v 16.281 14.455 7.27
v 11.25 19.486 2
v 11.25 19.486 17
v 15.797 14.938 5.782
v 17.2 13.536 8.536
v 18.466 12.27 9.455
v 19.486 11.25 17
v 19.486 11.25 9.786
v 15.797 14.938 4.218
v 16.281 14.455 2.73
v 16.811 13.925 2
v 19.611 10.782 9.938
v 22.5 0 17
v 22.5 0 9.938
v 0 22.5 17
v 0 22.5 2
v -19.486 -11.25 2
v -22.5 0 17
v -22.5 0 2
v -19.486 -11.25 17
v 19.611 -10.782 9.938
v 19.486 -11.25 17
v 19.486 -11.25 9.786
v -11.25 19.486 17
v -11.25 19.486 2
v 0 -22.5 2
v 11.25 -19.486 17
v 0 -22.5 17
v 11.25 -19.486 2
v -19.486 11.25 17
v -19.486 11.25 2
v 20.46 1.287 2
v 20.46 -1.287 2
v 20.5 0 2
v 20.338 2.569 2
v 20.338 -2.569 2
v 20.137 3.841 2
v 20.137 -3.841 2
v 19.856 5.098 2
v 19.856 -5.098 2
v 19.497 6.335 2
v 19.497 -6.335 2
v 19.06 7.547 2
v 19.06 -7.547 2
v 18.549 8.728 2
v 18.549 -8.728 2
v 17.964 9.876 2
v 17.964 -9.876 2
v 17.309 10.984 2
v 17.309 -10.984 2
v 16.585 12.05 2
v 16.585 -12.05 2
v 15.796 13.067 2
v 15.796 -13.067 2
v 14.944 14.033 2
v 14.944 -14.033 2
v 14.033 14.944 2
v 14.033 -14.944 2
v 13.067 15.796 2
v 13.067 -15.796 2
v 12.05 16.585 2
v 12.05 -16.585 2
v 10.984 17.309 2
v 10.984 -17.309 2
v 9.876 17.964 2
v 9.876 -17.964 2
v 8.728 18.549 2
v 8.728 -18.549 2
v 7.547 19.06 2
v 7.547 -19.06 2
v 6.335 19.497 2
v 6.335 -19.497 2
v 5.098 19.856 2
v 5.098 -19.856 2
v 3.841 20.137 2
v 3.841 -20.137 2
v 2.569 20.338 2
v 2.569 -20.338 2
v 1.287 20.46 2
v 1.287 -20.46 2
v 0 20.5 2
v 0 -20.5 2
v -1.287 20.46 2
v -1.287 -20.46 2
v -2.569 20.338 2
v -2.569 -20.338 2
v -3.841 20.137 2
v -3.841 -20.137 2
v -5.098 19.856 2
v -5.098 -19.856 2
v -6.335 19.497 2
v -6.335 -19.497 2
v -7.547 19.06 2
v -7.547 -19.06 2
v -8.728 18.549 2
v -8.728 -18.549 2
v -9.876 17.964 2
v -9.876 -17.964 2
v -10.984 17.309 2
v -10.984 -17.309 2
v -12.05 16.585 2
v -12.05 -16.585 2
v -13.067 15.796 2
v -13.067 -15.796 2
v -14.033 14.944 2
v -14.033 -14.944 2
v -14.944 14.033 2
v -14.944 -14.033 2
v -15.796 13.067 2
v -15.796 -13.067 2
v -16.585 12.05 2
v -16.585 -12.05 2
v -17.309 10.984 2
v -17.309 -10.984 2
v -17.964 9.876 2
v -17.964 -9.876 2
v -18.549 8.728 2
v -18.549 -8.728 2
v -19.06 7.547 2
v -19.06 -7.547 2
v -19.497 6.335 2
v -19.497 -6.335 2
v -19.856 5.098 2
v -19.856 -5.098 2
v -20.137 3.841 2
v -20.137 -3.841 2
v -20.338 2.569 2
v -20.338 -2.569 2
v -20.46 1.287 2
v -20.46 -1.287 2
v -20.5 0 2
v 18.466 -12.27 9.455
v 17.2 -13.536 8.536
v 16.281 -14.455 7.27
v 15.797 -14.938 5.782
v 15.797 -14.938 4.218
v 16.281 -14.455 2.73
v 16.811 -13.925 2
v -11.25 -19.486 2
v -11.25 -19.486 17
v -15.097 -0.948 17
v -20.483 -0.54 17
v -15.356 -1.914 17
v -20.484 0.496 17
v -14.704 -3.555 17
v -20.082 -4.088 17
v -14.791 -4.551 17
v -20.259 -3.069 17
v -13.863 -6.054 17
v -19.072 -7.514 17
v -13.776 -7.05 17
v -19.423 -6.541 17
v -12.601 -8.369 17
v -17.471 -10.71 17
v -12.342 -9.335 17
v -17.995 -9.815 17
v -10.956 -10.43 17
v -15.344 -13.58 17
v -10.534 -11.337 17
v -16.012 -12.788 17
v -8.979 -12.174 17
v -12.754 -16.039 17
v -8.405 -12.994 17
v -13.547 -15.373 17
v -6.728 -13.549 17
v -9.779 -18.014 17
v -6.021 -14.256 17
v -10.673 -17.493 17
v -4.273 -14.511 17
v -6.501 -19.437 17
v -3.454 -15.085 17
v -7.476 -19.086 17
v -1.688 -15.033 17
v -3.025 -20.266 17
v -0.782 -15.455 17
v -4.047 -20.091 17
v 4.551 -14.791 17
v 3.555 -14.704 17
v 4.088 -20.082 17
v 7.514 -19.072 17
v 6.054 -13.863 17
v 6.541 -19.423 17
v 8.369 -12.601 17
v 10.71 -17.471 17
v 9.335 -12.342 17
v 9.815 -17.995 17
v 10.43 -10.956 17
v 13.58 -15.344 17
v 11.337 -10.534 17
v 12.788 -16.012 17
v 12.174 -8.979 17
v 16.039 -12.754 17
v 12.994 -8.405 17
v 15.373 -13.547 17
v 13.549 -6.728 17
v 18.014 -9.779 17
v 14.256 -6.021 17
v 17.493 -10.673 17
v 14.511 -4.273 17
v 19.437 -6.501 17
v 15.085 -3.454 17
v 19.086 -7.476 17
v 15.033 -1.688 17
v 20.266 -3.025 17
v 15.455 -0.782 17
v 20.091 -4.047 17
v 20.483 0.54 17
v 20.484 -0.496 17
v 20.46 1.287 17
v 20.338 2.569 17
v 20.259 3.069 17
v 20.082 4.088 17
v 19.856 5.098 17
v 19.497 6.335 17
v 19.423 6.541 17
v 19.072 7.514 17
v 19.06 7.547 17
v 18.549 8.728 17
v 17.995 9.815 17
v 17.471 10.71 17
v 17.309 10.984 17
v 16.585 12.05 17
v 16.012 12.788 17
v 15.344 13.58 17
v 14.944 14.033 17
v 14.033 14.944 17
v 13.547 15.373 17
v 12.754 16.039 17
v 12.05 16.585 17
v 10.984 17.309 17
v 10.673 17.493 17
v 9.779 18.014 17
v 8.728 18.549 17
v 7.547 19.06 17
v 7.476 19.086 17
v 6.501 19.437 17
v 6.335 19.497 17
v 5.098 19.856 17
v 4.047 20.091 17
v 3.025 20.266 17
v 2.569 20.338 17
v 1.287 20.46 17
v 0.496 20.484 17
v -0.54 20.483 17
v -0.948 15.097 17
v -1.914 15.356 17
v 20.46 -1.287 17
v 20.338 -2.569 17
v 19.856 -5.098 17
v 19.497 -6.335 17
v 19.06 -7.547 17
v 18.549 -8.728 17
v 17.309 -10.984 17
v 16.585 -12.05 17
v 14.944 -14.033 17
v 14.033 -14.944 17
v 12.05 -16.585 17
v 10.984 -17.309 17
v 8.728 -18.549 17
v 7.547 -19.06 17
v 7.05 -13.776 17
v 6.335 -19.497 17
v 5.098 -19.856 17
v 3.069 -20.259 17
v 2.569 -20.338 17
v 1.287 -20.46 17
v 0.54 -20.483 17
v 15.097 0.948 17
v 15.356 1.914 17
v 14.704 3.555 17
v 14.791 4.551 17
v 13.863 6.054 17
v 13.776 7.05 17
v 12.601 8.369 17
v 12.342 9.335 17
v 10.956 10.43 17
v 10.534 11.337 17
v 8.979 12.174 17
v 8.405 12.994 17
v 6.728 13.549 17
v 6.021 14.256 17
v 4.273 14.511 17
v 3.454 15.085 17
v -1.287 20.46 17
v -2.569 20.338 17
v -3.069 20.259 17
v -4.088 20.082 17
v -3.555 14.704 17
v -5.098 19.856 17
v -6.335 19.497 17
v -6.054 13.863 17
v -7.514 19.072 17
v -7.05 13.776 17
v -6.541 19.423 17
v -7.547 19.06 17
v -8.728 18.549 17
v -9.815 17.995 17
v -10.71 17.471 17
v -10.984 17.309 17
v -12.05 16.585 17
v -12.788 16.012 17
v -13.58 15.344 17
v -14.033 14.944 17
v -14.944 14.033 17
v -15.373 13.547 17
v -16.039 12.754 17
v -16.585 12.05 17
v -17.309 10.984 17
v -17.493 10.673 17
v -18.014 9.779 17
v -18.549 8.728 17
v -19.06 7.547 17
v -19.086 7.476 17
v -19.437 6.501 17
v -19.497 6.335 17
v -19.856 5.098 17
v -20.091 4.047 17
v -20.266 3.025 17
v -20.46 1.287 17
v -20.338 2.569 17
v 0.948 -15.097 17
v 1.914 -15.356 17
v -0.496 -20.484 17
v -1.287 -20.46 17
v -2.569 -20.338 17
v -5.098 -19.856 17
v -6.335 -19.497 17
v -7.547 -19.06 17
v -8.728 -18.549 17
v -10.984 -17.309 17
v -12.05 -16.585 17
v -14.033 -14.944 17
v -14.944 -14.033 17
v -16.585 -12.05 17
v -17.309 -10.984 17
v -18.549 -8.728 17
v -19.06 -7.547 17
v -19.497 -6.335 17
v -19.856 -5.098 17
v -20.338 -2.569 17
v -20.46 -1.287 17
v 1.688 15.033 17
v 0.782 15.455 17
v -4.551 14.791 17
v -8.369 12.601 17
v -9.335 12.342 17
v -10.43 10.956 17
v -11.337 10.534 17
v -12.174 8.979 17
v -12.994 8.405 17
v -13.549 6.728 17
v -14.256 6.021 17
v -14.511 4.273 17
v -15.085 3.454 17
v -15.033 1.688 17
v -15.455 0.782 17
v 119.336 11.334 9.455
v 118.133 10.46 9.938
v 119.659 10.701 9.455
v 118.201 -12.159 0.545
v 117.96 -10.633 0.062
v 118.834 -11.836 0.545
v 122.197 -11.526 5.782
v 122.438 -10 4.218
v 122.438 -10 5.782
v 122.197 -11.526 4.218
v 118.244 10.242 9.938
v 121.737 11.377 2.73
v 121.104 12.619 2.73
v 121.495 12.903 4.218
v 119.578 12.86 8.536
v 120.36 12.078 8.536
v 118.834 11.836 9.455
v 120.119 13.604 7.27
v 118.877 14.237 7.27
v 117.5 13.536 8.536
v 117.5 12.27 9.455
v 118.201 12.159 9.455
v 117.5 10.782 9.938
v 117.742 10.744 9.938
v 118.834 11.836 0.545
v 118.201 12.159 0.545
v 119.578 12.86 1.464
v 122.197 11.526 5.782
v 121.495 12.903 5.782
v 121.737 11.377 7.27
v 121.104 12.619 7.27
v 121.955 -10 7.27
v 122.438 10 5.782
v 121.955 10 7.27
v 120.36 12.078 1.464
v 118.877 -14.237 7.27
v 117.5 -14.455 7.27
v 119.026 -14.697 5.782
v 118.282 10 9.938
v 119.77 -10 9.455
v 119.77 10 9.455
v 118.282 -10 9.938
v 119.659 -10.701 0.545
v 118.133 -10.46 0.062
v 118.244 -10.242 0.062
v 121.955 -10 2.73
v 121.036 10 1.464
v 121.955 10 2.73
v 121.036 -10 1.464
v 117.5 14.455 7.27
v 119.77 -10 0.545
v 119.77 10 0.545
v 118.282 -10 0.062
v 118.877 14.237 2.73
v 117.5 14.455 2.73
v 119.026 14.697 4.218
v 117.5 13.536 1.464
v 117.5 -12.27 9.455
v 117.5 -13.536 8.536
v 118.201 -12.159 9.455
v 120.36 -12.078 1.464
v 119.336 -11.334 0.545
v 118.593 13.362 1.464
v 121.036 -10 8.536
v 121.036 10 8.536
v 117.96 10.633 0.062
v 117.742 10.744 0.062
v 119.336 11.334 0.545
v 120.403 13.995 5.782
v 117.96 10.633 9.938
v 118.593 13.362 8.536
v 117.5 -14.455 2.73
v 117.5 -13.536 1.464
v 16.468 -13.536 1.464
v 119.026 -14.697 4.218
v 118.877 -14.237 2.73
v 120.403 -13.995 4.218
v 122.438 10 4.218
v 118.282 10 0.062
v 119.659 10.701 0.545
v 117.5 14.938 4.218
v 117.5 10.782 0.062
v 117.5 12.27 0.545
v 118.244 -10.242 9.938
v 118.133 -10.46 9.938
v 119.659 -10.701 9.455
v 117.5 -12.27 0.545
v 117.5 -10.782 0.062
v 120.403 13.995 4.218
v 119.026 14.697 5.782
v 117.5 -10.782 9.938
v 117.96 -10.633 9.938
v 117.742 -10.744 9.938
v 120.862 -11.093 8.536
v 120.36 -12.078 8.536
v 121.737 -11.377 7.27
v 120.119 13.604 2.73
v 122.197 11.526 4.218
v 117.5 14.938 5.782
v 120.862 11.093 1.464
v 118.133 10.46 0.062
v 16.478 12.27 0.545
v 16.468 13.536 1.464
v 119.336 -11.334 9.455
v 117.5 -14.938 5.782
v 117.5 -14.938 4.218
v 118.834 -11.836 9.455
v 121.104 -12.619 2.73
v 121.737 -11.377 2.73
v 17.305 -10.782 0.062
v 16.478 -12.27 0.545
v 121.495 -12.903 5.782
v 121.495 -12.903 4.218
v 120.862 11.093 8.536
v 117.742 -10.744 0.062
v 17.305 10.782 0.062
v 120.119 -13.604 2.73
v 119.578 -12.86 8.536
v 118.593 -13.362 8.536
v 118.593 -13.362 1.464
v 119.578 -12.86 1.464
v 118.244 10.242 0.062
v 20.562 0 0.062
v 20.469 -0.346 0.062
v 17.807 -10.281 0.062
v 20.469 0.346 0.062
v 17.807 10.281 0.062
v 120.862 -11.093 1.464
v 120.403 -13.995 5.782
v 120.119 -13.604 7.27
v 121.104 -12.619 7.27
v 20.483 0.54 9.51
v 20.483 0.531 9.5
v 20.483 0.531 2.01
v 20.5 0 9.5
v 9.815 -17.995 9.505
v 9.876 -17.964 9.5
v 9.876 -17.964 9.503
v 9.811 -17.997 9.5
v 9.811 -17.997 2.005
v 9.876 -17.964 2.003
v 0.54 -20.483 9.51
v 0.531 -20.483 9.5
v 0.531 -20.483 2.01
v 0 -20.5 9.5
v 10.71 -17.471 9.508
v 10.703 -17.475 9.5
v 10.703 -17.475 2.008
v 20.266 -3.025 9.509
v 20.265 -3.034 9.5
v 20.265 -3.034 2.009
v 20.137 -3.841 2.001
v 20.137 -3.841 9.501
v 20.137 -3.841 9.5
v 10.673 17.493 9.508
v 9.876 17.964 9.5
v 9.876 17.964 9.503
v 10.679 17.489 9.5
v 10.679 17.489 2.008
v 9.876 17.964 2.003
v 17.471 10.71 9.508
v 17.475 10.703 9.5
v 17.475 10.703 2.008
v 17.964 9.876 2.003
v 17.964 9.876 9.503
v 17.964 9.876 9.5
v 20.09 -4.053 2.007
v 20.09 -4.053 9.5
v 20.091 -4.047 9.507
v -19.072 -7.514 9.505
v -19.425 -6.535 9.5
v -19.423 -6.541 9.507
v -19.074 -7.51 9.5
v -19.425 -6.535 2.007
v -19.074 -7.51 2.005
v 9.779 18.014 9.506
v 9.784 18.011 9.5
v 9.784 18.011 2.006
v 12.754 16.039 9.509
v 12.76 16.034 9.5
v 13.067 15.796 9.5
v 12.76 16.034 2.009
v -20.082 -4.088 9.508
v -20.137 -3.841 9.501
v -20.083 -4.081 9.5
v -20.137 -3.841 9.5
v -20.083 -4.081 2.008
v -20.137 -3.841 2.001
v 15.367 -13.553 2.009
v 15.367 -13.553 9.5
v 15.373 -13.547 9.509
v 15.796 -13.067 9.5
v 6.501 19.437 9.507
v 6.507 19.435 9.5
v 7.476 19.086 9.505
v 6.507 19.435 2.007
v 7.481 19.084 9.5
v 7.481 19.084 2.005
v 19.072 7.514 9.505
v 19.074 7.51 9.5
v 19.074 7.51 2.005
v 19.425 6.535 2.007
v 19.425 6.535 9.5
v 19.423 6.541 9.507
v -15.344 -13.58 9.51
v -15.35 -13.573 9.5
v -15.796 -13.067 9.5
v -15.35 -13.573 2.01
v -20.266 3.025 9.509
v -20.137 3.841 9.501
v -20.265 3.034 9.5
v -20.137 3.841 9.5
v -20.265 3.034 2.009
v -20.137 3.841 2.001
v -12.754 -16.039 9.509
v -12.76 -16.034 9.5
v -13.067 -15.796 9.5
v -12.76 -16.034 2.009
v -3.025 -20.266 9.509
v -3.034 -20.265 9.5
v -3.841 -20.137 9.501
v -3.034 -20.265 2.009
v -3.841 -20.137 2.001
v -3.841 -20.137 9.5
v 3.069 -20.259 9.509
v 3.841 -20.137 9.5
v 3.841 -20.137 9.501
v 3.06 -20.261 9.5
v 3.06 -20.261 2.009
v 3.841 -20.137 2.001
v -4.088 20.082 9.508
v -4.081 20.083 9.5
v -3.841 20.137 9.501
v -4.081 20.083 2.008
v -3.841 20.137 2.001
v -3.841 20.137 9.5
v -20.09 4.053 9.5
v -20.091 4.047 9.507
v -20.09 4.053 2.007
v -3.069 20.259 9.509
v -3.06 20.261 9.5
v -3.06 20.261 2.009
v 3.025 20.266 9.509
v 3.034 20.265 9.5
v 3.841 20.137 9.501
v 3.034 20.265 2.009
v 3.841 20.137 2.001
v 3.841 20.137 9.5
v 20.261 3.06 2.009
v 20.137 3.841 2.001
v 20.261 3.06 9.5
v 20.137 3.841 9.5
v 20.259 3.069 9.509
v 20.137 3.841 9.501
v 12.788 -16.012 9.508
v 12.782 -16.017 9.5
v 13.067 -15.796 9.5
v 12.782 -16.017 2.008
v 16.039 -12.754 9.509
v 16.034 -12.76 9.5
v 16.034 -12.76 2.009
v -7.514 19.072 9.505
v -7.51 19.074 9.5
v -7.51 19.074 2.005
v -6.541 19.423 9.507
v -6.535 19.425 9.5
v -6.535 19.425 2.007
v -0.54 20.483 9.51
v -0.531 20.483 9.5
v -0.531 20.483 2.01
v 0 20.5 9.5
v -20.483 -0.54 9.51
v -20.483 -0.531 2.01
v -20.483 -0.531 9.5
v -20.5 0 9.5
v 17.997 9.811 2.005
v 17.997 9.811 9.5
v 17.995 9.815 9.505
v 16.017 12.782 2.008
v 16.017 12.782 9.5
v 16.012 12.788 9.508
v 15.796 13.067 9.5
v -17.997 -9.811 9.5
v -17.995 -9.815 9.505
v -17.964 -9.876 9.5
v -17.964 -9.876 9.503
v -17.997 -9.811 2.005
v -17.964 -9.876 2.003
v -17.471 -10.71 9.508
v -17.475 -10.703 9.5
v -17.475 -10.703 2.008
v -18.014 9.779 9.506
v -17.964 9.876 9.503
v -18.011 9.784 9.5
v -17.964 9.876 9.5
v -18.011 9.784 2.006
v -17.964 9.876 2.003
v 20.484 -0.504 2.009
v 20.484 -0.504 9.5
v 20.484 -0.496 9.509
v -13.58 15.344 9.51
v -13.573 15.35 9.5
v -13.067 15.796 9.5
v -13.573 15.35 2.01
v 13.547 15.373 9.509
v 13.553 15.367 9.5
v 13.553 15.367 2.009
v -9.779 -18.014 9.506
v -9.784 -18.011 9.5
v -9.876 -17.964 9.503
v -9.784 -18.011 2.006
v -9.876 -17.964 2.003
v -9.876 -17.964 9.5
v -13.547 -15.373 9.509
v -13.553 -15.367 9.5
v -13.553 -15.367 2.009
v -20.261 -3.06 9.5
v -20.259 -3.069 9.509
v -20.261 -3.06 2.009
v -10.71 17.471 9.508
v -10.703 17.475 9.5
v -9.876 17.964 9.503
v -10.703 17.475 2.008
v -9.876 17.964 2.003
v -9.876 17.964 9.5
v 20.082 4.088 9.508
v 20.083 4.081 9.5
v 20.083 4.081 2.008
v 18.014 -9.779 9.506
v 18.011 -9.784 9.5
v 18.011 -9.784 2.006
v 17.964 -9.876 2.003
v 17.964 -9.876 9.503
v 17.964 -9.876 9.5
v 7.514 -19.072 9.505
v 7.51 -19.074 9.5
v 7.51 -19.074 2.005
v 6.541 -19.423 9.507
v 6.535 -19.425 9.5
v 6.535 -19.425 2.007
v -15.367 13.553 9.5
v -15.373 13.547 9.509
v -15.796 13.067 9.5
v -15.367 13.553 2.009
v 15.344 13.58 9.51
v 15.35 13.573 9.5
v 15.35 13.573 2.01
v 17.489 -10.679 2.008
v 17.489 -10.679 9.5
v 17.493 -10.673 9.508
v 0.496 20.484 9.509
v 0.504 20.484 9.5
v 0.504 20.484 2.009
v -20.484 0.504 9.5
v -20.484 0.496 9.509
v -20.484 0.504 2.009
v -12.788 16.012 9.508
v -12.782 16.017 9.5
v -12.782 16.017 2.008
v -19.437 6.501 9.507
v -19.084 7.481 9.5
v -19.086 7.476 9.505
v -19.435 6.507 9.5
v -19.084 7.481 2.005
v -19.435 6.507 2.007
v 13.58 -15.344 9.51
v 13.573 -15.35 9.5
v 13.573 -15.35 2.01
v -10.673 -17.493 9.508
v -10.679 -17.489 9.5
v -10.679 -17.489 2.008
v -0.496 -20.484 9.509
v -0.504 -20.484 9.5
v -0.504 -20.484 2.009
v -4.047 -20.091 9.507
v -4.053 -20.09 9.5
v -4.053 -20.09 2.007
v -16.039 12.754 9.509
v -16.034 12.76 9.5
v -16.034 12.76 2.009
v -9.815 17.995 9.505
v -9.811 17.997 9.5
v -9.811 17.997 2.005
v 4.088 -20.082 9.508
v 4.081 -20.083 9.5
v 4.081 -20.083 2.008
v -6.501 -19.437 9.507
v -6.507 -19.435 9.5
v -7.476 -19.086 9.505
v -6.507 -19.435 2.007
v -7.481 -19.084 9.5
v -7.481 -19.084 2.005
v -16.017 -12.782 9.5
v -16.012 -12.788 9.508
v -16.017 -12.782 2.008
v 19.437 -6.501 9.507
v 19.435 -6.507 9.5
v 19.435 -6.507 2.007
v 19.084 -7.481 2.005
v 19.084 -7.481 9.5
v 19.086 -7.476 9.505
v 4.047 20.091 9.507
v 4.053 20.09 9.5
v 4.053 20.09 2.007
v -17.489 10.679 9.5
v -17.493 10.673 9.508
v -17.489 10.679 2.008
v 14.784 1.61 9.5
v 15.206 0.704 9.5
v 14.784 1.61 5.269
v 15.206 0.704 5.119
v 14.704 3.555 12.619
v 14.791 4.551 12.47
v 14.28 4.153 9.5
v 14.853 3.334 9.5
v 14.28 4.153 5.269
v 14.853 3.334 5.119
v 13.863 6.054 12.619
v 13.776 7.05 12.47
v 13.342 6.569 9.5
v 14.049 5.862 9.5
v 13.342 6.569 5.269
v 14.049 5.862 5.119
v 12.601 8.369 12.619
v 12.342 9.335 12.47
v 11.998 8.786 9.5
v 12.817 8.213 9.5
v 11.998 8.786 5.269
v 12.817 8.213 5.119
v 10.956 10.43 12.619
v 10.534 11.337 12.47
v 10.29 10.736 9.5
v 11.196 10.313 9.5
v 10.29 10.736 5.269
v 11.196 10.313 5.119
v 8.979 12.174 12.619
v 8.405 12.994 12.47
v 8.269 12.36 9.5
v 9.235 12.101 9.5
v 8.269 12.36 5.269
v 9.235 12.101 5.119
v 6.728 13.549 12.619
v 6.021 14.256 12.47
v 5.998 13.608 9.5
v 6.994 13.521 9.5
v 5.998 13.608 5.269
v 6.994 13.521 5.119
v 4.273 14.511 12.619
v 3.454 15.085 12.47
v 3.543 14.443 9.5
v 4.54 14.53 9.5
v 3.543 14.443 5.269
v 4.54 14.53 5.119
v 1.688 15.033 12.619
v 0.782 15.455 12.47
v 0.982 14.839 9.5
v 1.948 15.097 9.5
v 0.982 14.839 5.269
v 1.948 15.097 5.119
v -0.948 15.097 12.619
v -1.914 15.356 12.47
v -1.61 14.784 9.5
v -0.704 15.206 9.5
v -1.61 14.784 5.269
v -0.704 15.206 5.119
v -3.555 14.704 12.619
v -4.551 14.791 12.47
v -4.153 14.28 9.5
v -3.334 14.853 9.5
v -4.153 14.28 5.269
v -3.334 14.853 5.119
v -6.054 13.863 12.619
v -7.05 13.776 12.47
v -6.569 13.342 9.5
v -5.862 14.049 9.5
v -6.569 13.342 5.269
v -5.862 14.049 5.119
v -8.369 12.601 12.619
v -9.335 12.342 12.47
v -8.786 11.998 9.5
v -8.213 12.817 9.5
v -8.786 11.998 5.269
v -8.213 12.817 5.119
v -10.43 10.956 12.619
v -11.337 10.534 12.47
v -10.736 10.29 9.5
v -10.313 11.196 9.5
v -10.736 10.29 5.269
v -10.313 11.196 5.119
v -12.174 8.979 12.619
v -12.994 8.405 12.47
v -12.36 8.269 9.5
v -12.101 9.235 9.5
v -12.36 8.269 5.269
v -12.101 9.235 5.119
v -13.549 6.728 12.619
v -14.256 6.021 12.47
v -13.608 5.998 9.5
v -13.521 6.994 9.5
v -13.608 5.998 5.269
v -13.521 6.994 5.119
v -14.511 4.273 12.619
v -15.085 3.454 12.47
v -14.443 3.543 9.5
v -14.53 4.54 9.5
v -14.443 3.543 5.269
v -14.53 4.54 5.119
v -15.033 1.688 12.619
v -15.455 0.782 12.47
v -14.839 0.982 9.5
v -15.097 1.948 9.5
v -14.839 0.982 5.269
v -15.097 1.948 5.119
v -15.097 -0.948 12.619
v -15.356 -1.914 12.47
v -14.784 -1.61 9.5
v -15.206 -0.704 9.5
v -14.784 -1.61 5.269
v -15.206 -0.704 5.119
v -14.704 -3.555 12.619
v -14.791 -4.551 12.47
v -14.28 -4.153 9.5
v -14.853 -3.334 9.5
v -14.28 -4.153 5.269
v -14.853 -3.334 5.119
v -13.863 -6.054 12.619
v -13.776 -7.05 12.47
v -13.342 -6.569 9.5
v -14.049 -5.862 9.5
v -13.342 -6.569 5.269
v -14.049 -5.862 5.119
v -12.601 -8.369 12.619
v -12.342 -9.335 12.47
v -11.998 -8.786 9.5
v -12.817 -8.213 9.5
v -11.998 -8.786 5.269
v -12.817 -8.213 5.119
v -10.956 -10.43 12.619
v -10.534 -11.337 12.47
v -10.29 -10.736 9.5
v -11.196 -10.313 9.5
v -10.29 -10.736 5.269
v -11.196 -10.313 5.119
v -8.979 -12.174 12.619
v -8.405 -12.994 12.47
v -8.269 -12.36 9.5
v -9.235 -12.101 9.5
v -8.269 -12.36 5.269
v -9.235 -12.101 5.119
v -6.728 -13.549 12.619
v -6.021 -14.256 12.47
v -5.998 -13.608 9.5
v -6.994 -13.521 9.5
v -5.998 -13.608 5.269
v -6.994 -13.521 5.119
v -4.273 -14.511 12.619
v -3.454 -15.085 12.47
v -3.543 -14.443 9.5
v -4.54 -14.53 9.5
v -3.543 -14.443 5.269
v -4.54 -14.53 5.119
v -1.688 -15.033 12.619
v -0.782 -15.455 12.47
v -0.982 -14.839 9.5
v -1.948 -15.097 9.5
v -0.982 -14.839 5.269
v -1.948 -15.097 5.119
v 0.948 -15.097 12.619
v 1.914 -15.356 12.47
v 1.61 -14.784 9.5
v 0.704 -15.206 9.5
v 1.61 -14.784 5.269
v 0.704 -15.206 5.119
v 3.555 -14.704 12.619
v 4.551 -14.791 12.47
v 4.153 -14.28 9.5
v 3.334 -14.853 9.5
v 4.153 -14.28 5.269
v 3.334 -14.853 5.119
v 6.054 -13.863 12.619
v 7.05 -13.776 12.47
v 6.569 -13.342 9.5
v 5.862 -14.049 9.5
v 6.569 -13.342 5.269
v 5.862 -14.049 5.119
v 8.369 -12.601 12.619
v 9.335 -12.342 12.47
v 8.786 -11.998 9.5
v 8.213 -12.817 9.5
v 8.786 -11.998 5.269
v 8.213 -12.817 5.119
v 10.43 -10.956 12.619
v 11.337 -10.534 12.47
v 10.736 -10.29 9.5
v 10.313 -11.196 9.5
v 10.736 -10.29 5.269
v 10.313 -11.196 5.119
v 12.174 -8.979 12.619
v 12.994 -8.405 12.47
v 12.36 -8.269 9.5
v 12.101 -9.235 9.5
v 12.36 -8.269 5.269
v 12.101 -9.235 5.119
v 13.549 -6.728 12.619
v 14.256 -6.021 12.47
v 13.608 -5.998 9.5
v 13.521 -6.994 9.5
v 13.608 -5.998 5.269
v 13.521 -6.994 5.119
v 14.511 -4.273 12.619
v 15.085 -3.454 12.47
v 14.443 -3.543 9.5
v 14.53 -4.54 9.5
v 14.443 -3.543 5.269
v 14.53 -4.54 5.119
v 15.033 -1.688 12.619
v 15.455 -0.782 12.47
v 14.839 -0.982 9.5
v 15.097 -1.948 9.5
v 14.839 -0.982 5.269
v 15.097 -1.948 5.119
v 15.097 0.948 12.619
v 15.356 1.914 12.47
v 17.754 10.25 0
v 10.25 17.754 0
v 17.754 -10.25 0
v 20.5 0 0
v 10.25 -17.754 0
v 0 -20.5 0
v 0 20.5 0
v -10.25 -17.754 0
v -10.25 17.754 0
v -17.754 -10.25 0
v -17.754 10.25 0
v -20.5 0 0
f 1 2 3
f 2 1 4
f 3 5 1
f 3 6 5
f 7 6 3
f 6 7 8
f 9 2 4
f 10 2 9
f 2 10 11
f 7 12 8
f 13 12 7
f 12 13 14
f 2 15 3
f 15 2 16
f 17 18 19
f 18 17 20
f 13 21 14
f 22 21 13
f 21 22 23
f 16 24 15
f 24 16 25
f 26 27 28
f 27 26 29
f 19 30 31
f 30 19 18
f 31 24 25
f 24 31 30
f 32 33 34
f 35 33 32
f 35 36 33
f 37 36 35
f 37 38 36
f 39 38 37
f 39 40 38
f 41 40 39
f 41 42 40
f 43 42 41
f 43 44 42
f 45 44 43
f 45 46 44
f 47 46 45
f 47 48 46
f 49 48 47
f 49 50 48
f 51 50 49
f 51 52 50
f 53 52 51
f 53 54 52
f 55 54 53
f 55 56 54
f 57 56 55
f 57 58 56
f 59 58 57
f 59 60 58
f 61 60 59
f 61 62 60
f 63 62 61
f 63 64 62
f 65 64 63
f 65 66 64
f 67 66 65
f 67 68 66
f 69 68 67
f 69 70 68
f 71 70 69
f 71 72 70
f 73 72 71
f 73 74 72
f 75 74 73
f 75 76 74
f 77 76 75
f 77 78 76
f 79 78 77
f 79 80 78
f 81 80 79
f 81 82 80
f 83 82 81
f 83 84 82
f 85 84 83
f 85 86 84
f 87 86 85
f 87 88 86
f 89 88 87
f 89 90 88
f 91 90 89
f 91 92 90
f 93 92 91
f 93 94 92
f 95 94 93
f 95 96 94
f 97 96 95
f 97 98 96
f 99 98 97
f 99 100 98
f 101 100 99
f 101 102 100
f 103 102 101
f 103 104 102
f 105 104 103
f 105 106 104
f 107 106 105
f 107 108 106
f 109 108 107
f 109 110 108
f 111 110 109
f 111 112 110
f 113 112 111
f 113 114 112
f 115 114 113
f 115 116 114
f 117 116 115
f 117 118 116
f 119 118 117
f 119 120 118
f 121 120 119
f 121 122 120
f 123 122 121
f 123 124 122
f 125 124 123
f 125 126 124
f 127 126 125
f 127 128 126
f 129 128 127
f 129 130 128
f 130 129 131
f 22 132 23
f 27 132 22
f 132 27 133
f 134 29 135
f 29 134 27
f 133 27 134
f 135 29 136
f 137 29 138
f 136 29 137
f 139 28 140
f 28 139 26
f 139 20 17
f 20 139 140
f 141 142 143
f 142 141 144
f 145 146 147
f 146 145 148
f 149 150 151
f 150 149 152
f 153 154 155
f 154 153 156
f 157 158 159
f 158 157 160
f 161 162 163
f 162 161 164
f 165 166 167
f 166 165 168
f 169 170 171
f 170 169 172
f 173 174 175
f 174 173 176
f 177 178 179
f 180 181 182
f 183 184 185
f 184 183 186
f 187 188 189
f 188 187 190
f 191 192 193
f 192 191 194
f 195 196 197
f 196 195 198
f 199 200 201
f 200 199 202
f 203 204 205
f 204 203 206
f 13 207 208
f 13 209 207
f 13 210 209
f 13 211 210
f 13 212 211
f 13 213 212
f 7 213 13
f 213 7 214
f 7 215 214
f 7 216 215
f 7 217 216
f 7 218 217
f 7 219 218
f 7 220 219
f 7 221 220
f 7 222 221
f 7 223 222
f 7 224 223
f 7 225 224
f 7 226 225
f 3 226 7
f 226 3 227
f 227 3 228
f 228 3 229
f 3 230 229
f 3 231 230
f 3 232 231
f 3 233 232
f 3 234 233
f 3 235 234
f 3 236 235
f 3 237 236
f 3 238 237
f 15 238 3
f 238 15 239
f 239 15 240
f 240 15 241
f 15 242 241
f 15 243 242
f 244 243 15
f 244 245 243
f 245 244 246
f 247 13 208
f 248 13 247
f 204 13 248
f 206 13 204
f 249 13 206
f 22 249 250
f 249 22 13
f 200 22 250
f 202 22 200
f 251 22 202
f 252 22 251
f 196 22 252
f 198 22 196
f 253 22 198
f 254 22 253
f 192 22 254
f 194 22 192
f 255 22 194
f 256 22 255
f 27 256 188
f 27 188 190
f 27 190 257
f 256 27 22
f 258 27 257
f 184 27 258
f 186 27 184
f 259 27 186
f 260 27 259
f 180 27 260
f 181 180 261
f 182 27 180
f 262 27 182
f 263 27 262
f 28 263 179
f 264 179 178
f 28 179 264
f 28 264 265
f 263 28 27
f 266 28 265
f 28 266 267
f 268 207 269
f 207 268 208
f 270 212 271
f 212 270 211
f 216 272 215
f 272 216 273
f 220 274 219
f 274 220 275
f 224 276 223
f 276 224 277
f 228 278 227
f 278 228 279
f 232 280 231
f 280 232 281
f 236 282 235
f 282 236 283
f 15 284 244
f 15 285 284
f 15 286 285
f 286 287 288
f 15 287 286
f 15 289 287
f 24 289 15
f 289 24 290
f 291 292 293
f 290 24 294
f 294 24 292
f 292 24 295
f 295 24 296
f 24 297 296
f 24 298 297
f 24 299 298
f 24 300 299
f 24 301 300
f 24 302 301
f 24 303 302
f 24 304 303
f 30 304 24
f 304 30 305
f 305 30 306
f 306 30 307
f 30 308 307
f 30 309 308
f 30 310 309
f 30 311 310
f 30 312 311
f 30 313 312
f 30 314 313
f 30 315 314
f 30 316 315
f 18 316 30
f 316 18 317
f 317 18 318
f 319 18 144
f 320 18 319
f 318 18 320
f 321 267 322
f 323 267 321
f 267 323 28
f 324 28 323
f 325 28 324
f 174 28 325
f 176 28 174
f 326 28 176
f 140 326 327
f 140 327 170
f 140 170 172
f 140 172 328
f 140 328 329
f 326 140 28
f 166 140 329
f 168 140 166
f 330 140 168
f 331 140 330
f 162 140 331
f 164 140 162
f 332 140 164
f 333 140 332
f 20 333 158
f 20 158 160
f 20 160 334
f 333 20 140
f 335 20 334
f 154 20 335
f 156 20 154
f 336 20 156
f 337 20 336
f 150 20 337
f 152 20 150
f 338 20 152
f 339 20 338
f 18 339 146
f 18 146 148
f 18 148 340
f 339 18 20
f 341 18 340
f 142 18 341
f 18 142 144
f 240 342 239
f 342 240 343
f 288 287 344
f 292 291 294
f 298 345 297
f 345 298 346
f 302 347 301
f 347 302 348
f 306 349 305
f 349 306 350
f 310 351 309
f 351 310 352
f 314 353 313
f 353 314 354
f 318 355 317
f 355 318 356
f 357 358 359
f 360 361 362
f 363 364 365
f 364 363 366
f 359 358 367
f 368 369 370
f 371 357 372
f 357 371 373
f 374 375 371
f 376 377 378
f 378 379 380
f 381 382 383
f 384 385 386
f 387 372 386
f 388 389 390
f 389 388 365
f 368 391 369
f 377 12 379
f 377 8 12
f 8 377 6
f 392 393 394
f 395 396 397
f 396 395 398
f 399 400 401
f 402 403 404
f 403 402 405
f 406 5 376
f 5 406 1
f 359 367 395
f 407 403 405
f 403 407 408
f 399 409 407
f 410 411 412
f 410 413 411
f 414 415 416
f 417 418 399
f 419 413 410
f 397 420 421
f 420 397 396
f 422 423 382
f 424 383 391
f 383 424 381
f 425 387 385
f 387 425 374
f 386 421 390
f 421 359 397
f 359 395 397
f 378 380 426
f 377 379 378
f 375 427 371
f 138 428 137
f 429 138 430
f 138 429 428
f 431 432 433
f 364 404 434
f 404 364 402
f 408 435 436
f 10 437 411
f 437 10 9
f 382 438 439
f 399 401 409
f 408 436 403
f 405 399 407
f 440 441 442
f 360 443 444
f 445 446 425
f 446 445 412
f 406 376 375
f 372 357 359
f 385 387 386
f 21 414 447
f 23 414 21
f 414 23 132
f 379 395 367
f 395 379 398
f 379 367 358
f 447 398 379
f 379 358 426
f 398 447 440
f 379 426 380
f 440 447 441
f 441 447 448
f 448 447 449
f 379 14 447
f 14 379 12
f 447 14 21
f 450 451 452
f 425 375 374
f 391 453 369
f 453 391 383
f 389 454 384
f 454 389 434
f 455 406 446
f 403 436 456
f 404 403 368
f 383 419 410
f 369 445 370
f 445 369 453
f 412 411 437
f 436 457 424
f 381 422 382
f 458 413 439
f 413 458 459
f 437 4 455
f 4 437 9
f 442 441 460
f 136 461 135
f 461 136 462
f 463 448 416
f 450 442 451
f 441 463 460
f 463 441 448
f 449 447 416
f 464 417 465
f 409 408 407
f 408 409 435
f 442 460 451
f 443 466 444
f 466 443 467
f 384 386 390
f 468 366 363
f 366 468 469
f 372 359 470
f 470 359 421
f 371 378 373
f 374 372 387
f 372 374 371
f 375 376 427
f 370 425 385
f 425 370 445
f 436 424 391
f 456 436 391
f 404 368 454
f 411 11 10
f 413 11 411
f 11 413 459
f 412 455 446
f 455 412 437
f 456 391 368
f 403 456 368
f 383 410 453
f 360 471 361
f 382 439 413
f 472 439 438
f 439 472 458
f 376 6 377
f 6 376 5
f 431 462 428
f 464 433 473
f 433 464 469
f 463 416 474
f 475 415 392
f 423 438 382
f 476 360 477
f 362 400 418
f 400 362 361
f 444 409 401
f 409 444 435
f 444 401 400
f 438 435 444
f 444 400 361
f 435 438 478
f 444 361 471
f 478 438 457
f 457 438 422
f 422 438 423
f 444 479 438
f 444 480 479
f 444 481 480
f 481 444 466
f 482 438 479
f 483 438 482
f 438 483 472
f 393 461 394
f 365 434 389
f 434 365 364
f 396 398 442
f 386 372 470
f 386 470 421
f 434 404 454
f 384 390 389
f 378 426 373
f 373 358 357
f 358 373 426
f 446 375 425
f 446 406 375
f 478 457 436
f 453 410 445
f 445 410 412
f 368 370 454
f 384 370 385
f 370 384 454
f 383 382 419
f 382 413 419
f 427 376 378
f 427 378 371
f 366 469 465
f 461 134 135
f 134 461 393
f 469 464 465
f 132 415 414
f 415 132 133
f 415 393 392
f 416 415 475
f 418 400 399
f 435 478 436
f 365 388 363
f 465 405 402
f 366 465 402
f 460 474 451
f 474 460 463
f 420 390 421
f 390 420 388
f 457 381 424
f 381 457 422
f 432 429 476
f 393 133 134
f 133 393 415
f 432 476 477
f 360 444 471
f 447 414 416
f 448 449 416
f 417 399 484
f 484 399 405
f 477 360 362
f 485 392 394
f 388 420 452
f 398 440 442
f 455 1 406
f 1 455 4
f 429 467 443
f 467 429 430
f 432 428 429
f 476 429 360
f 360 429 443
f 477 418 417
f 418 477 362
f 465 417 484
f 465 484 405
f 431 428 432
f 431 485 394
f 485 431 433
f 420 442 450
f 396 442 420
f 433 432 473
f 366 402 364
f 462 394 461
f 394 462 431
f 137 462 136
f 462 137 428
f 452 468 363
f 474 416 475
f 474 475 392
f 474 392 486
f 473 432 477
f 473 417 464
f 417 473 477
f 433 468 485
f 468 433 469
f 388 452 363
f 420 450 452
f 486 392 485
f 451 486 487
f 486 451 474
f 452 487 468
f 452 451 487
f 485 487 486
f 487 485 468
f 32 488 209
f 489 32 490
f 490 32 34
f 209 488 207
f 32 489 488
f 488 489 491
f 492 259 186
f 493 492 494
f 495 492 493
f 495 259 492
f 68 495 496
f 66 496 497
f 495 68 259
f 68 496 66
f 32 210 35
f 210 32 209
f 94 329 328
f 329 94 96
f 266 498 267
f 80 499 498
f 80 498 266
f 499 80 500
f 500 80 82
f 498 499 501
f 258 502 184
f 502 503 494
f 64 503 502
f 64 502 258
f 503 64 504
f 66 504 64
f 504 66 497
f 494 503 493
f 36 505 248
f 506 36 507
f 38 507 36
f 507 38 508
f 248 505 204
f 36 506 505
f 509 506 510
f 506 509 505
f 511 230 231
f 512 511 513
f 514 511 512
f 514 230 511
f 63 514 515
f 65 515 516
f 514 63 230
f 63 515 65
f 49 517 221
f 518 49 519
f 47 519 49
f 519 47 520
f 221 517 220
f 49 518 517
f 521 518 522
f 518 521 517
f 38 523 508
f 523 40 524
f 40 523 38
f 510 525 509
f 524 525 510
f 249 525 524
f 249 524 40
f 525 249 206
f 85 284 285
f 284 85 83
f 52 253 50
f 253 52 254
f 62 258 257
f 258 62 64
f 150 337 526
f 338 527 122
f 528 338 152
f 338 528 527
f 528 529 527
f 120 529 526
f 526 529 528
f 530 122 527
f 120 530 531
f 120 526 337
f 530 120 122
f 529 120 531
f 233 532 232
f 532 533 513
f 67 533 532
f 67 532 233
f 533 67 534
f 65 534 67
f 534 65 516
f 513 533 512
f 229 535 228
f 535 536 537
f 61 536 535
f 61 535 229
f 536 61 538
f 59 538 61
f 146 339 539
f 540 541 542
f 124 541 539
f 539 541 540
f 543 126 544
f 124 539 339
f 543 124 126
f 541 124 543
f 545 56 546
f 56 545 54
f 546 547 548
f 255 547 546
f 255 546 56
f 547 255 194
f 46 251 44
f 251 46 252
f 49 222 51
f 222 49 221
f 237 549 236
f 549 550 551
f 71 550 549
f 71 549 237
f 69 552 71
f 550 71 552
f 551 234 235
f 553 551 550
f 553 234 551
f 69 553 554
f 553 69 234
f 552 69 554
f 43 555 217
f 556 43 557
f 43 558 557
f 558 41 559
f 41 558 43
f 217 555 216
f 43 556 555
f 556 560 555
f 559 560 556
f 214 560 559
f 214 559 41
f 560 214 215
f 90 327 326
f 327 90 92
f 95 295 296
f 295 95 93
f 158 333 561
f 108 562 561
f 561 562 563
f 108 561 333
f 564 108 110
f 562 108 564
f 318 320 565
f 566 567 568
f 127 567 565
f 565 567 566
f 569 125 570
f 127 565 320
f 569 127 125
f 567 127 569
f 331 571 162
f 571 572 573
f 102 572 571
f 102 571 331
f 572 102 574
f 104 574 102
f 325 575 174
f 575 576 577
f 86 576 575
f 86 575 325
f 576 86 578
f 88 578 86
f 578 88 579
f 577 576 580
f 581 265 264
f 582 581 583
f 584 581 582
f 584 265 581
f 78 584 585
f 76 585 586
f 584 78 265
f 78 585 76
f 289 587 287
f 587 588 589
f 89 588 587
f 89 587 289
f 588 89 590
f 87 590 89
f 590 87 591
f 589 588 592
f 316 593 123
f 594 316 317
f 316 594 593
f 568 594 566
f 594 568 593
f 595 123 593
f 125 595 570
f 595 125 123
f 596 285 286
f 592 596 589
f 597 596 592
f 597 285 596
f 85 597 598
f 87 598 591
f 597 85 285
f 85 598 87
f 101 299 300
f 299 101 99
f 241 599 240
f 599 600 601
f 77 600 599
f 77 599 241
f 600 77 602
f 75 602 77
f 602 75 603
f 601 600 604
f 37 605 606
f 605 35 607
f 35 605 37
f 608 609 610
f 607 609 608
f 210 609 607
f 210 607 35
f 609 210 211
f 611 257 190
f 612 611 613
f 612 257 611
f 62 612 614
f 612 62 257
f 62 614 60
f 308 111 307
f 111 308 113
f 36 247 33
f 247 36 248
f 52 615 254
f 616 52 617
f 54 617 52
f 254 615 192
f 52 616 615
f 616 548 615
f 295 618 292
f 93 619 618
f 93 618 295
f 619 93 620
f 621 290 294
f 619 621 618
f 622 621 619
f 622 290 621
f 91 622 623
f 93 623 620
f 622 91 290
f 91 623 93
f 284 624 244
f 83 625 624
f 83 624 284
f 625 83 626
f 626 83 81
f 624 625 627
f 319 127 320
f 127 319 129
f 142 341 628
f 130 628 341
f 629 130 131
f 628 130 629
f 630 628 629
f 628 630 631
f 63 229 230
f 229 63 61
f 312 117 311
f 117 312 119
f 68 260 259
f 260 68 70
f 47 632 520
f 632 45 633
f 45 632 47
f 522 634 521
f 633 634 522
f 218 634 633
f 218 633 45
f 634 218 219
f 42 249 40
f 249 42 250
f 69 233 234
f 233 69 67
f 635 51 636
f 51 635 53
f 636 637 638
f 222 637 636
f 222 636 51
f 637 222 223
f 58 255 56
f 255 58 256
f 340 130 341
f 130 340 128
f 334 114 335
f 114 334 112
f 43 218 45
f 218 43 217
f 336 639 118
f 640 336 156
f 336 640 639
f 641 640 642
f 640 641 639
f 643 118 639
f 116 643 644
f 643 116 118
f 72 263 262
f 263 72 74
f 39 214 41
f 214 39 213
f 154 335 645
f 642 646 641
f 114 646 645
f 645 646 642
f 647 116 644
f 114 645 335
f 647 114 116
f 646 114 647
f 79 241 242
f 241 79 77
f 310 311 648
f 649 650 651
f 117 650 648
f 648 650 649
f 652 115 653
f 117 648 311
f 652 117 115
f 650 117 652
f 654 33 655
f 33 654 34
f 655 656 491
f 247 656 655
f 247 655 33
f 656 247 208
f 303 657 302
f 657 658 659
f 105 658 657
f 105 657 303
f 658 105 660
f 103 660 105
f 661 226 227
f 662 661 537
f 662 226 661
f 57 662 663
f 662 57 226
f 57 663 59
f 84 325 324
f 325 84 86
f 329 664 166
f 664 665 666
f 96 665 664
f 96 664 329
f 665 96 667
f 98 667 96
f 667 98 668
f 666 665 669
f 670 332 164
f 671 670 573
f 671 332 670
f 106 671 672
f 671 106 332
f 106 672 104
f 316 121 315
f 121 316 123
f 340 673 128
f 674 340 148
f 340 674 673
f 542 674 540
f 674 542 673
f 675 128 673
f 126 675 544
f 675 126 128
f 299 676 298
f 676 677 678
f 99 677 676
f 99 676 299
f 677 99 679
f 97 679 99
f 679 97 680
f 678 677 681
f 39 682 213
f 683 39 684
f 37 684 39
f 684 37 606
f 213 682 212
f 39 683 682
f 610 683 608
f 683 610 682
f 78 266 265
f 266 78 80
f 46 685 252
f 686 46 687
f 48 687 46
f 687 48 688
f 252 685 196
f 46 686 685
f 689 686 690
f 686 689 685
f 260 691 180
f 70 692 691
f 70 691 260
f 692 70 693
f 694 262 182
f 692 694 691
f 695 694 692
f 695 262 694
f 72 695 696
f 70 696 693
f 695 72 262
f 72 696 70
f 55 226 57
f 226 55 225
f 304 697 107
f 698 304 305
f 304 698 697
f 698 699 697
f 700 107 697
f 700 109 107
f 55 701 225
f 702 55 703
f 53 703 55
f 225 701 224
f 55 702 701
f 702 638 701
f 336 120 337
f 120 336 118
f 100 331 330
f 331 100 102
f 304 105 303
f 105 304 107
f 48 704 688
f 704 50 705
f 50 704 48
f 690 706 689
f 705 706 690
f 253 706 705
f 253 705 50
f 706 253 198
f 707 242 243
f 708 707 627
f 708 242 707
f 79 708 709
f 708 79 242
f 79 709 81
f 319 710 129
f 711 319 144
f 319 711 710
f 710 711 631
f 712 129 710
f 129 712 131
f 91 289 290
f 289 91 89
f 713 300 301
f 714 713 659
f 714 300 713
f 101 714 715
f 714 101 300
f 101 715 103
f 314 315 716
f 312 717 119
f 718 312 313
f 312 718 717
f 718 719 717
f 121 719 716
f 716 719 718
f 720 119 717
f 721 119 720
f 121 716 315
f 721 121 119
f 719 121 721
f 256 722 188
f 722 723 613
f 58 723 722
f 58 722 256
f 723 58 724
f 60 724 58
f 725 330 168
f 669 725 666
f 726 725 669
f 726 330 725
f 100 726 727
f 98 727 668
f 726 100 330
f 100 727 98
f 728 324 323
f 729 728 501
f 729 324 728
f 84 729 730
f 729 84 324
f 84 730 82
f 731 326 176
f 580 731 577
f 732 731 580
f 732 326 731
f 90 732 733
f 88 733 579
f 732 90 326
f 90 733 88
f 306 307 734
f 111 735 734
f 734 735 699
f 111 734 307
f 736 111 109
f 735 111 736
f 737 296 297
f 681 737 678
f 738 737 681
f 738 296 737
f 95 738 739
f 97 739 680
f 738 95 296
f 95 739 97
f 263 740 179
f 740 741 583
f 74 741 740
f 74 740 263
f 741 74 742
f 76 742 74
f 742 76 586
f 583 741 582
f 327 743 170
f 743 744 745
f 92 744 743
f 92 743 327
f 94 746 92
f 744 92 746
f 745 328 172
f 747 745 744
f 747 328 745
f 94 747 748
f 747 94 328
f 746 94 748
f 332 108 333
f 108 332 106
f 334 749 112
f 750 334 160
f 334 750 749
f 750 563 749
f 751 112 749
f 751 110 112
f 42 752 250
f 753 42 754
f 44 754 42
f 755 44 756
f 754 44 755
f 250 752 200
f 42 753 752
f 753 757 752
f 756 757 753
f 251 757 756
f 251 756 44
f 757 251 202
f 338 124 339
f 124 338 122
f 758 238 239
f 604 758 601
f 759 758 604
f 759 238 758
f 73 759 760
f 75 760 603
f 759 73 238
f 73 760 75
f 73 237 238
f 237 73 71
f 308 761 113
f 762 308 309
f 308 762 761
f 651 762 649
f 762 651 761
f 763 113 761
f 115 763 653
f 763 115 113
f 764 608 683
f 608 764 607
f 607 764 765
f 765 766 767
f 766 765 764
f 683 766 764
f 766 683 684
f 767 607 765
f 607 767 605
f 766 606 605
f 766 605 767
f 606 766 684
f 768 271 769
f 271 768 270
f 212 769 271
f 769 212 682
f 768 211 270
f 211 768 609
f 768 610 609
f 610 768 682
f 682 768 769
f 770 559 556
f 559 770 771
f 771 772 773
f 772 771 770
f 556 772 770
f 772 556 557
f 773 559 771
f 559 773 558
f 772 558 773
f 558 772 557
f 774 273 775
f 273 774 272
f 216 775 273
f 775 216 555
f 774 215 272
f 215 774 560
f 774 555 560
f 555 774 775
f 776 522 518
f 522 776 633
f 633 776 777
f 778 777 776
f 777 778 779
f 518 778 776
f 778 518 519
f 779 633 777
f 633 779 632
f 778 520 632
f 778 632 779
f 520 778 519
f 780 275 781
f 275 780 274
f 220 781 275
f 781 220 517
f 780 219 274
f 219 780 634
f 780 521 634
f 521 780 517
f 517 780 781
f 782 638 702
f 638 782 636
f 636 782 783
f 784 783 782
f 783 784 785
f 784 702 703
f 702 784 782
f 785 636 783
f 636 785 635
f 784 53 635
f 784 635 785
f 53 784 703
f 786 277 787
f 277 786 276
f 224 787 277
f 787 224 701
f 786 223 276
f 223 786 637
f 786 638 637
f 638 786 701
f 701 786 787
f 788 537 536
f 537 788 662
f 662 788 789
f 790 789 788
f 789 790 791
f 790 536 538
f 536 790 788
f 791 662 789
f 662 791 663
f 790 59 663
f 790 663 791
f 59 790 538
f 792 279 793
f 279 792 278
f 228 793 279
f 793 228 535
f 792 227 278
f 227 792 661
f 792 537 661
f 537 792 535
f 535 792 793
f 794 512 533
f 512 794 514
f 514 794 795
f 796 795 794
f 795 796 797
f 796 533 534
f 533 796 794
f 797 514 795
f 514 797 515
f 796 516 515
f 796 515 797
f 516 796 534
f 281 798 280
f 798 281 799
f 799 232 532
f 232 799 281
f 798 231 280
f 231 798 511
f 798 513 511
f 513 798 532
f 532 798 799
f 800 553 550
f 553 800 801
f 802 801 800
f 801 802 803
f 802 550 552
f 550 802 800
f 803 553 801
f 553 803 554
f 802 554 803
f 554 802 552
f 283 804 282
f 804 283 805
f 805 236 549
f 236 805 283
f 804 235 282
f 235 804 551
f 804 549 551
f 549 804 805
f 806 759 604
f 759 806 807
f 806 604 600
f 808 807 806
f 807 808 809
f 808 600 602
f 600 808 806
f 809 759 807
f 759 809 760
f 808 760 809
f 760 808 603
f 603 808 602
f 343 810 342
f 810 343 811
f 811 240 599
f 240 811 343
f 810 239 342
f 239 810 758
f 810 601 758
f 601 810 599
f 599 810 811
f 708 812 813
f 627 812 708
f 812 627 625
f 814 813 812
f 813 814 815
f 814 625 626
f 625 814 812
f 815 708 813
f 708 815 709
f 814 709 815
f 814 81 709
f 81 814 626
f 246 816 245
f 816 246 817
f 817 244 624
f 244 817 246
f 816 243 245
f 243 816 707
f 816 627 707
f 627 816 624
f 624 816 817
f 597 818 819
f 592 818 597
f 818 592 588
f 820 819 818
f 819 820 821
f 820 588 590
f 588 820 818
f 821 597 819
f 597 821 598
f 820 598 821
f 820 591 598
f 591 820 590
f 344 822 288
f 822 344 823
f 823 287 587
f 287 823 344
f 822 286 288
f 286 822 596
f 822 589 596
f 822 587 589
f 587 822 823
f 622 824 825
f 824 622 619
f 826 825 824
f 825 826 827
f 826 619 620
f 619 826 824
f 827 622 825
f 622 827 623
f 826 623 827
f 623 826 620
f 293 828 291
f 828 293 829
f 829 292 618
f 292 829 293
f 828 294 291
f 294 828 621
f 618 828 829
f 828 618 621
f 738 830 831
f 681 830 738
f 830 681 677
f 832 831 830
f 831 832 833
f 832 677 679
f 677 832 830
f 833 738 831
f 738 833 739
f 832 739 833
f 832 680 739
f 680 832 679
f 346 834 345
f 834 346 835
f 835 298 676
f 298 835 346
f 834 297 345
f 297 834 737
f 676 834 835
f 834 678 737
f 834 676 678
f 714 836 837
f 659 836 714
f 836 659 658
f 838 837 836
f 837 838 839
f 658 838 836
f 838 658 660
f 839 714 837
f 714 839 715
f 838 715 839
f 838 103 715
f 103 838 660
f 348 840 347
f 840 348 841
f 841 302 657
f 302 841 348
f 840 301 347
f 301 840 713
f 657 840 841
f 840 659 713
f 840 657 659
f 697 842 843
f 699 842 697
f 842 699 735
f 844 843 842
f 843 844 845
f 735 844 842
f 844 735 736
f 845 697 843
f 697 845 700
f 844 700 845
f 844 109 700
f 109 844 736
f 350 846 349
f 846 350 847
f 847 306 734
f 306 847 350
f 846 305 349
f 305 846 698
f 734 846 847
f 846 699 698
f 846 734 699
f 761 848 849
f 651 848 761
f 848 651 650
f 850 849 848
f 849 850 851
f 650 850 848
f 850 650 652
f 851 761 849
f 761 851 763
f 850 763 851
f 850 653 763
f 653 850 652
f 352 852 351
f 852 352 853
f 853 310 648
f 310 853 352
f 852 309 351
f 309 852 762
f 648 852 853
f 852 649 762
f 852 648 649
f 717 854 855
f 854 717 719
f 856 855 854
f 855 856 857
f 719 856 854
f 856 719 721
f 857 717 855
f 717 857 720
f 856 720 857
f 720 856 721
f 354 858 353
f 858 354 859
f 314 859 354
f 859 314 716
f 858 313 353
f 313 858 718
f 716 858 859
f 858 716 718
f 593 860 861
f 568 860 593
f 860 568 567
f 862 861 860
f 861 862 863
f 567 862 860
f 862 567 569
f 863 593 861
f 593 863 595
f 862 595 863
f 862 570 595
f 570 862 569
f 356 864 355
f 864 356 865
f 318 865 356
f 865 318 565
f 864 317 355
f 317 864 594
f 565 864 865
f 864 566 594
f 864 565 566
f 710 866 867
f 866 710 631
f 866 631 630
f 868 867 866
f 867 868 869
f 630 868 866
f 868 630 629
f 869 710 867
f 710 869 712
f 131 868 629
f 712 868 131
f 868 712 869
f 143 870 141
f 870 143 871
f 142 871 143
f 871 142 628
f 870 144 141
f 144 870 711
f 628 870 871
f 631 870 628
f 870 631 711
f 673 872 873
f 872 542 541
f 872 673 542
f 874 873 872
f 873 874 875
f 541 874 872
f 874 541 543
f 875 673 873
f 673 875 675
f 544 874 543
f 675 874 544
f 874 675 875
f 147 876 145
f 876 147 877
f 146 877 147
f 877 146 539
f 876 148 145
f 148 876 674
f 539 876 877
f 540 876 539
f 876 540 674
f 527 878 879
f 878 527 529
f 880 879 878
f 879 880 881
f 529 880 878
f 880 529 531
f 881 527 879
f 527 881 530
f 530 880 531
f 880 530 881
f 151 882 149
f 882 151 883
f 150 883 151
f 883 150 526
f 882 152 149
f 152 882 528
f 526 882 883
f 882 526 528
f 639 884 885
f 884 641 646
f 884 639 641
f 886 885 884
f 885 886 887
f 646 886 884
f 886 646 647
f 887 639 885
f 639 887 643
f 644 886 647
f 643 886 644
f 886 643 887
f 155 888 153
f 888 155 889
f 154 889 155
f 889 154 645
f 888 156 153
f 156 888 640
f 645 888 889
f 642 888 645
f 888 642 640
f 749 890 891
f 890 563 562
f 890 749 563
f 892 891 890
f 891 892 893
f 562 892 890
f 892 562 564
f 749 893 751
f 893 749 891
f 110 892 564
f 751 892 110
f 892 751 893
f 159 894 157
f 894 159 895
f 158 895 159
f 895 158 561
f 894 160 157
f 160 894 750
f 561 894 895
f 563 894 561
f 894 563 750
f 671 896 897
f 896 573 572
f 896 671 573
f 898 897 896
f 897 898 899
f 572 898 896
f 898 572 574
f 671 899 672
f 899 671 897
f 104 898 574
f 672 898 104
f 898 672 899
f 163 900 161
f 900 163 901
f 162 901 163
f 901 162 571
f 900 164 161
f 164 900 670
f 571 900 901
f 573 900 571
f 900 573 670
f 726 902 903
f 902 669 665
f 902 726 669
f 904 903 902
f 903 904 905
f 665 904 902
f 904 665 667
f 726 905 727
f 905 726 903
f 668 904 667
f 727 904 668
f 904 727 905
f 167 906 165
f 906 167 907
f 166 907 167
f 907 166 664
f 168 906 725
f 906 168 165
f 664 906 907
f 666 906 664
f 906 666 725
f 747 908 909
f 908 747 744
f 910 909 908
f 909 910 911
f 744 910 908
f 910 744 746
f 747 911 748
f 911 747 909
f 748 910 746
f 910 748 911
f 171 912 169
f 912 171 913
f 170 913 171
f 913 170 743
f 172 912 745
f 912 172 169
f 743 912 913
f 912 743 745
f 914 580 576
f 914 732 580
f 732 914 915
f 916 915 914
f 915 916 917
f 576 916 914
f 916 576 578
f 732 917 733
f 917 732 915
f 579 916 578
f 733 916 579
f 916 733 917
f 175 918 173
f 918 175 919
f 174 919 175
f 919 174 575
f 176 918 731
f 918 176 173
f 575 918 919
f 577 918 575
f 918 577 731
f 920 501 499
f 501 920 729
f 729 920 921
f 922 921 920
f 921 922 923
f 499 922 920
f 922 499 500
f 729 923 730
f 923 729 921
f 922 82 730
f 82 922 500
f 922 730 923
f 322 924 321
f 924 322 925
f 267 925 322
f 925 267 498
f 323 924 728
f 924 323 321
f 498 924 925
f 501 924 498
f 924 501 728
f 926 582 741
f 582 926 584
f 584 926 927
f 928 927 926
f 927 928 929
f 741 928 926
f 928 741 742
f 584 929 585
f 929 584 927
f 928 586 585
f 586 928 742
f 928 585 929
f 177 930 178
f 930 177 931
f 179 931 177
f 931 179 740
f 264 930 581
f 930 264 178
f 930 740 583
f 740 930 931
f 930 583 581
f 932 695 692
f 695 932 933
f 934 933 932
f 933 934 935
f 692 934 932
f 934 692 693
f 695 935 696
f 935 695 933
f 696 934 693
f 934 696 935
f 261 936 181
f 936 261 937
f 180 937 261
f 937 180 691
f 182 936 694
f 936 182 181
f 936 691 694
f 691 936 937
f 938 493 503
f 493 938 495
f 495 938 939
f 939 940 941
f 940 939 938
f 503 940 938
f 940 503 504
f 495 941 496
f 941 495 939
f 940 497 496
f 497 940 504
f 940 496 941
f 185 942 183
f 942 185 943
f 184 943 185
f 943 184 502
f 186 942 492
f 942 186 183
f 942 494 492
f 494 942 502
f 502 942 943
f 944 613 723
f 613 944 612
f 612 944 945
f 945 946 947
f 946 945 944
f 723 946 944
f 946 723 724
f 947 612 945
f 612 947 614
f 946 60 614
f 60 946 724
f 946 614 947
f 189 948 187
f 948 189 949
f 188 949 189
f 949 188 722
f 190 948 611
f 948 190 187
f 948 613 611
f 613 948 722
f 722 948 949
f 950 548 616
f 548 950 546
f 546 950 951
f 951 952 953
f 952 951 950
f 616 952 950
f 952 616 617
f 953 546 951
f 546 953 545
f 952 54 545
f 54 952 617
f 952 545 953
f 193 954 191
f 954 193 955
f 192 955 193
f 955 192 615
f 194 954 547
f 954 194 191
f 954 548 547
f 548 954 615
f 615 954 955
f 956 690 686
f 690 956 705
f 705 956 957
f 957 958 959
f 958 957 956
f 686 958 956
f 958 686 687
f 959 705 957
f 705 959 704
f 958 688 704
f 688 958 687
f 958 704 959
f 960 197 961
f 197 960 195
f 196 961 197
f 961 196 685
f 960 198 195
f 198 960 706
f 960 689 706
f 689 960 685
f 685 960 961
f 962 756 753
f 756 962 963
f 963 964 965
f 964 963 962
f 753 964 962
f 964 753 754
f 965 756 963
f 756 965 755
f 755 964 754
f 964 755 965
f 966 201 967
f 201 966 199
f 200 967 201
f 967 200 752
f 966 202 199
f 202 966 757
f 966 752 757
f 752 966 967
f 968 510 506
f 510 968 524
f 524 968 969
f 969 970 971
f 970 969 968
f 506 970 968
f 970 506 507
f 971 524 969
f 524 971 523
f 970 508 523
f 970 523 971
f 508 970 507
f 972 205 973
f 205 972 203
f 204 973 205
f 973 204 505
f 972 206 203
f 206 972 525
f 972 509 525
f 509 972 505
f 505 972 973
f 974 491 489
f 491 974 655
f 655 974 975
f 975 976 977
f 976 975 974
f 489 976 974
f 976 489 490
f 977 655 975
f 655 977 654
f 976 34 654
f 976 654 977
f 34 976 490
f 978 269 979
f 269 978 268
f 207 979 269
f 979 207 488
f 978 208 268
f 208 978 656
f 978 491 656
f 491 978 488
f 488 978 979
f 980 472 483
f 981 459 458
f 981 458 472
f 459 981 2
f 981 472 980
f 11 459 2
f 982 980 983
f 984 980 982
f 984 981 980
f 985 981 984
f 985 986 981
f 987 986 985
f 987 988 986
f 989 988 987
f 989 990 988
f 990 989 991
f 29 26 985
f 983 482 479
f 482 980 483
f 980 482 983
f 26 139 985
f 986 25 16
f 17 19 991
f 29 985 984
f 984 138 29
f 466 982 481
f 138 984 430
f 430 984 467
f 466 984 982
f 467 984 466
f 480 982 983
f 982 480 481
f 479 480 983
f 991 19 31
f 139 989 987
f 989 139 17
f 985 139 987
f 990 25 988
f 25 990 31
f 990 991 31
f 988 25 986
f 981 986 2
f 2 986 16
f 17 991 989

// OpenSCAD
//parametric ›soda bottle opener and closer wrench
//John Finch 12/6/13


cap_dia = 30.5;
cap_height = 15;
interference = .01;  //fraction the spine protruding into cap diameter
handle_length = 100;
handle = "yes";  // yes or no

outer_dia = 45;
inner_dia = cap_dia * (1-interference);
wall_thickness = 2;
spine_angle = 15;
spine_thickness = 1;
num_spines = 36;

spine_length = (outer_dia/2-wall_thickness-inner_dia/2)/cos(spine_angle);

fa=0.1;
fs=0.5;

module roundedCube(size, radius)  //Using hull() and spheres
{
x = size[0];
y = size[1];
z = size[2];
fn=20;

//Set bounds on the radius 
radius=max(0.1,radius);
radius=min(radius,min(x,min(y,z))/2);
//echo ("Radius= ",radius);

//echo (x, y, z, radius);


hull()
	{
	translate([radius,radius,radius])
	sphere(r=radius,$fn=fn);

	translate([radius,radius,z-radius])
	sphere(r=radius,$fn=fn);

	translate([x-radius,radius,radius])
	sphere(r=radius,$fn=fn);

	translate([x-radius,radius,z-radius])
	sphere(r=radius,$fn=fn);

	translate([radius,y-radius,radius])
	sphere(r=radius,$fn=fn);

	translate([radius,y-radius,z-radius])
	sphere(r=radius,$fn=fn);

	translate([x-radius,y-radius,radius])
	sphere(r=radius,$fn=fn);

	translate([x-radius,y-radius,z-radius])
	sphere(r=radius,$fn=fn);

	
	

	}
}
module spine(){
//echo(outer_dia/2-wall_thickness-spine_length);
//echo(-spine_thickness/2);
difference(){
	
		translate ([outer_dia/2-wall_thickness-spine_length*cos(spine_angle),-spine_thickness/2-spine_length*sin(spine_angle),0])
		rotate([0,0,spine_angle])
		cube([spine_length+.5,spine_thickness,cap_height/2]);
	

	translate([outer_dia/2-wall_thickness-spine_length,spine_length/2,0])
	rotate([90,0,0])
	cylinder(h=spine_length,r1=spine_length, r2=spine_length,$fn=3);
	}

	difference(){
	
	translate ([outer_dia/2-wall_thickness-spine_length*cos(spine_angle),-spine_thickness/2+spine_length*sin(spine_angle),cap_height/2])
	rotate([0,0,-spine_angle])
	cube([spine_length+.5,spine_thickness,cap_height/2]);

	translate([outer_dia/2-wall_thickness-spine_length,spine_length/2,cap_height/2])
	rotate([90,0,0])
	cylinder(h=spine_length,r1=spine_length, r2=spine_length,$fn=3);
	}




}


translate([0,0,2])
difference(){
	union(){
		cylinder(h = cap_height, r1 = outer_dia/2, r2 = outer_dia/2, $fn=12);
		//Insert handle
		if (handle == "yes"){
		translate([0,-15,-2])
		roundedCube([handle_length+outer_dia/2,30,10],5);
		}
	}
	
	cylinder(h = cap_height, r1 = outer_dia/2-wall_thickness, r2 = outer_dia/2-wall_thickness, $fn=100); // $fa=fa, $fs=fs);

	}
rot_angle = 360/num_spines;
translate([0,0,2])
for ( i = [ 1 : num_spines ] )
	{
	rotate([0,0,i*rot_angle])
	spine();
	}

translate([0,0,0])
cylinder(h = 2, r1 = outer_dia/2-2, r2 = outer_dia/2, $fn=12);



//spine();
